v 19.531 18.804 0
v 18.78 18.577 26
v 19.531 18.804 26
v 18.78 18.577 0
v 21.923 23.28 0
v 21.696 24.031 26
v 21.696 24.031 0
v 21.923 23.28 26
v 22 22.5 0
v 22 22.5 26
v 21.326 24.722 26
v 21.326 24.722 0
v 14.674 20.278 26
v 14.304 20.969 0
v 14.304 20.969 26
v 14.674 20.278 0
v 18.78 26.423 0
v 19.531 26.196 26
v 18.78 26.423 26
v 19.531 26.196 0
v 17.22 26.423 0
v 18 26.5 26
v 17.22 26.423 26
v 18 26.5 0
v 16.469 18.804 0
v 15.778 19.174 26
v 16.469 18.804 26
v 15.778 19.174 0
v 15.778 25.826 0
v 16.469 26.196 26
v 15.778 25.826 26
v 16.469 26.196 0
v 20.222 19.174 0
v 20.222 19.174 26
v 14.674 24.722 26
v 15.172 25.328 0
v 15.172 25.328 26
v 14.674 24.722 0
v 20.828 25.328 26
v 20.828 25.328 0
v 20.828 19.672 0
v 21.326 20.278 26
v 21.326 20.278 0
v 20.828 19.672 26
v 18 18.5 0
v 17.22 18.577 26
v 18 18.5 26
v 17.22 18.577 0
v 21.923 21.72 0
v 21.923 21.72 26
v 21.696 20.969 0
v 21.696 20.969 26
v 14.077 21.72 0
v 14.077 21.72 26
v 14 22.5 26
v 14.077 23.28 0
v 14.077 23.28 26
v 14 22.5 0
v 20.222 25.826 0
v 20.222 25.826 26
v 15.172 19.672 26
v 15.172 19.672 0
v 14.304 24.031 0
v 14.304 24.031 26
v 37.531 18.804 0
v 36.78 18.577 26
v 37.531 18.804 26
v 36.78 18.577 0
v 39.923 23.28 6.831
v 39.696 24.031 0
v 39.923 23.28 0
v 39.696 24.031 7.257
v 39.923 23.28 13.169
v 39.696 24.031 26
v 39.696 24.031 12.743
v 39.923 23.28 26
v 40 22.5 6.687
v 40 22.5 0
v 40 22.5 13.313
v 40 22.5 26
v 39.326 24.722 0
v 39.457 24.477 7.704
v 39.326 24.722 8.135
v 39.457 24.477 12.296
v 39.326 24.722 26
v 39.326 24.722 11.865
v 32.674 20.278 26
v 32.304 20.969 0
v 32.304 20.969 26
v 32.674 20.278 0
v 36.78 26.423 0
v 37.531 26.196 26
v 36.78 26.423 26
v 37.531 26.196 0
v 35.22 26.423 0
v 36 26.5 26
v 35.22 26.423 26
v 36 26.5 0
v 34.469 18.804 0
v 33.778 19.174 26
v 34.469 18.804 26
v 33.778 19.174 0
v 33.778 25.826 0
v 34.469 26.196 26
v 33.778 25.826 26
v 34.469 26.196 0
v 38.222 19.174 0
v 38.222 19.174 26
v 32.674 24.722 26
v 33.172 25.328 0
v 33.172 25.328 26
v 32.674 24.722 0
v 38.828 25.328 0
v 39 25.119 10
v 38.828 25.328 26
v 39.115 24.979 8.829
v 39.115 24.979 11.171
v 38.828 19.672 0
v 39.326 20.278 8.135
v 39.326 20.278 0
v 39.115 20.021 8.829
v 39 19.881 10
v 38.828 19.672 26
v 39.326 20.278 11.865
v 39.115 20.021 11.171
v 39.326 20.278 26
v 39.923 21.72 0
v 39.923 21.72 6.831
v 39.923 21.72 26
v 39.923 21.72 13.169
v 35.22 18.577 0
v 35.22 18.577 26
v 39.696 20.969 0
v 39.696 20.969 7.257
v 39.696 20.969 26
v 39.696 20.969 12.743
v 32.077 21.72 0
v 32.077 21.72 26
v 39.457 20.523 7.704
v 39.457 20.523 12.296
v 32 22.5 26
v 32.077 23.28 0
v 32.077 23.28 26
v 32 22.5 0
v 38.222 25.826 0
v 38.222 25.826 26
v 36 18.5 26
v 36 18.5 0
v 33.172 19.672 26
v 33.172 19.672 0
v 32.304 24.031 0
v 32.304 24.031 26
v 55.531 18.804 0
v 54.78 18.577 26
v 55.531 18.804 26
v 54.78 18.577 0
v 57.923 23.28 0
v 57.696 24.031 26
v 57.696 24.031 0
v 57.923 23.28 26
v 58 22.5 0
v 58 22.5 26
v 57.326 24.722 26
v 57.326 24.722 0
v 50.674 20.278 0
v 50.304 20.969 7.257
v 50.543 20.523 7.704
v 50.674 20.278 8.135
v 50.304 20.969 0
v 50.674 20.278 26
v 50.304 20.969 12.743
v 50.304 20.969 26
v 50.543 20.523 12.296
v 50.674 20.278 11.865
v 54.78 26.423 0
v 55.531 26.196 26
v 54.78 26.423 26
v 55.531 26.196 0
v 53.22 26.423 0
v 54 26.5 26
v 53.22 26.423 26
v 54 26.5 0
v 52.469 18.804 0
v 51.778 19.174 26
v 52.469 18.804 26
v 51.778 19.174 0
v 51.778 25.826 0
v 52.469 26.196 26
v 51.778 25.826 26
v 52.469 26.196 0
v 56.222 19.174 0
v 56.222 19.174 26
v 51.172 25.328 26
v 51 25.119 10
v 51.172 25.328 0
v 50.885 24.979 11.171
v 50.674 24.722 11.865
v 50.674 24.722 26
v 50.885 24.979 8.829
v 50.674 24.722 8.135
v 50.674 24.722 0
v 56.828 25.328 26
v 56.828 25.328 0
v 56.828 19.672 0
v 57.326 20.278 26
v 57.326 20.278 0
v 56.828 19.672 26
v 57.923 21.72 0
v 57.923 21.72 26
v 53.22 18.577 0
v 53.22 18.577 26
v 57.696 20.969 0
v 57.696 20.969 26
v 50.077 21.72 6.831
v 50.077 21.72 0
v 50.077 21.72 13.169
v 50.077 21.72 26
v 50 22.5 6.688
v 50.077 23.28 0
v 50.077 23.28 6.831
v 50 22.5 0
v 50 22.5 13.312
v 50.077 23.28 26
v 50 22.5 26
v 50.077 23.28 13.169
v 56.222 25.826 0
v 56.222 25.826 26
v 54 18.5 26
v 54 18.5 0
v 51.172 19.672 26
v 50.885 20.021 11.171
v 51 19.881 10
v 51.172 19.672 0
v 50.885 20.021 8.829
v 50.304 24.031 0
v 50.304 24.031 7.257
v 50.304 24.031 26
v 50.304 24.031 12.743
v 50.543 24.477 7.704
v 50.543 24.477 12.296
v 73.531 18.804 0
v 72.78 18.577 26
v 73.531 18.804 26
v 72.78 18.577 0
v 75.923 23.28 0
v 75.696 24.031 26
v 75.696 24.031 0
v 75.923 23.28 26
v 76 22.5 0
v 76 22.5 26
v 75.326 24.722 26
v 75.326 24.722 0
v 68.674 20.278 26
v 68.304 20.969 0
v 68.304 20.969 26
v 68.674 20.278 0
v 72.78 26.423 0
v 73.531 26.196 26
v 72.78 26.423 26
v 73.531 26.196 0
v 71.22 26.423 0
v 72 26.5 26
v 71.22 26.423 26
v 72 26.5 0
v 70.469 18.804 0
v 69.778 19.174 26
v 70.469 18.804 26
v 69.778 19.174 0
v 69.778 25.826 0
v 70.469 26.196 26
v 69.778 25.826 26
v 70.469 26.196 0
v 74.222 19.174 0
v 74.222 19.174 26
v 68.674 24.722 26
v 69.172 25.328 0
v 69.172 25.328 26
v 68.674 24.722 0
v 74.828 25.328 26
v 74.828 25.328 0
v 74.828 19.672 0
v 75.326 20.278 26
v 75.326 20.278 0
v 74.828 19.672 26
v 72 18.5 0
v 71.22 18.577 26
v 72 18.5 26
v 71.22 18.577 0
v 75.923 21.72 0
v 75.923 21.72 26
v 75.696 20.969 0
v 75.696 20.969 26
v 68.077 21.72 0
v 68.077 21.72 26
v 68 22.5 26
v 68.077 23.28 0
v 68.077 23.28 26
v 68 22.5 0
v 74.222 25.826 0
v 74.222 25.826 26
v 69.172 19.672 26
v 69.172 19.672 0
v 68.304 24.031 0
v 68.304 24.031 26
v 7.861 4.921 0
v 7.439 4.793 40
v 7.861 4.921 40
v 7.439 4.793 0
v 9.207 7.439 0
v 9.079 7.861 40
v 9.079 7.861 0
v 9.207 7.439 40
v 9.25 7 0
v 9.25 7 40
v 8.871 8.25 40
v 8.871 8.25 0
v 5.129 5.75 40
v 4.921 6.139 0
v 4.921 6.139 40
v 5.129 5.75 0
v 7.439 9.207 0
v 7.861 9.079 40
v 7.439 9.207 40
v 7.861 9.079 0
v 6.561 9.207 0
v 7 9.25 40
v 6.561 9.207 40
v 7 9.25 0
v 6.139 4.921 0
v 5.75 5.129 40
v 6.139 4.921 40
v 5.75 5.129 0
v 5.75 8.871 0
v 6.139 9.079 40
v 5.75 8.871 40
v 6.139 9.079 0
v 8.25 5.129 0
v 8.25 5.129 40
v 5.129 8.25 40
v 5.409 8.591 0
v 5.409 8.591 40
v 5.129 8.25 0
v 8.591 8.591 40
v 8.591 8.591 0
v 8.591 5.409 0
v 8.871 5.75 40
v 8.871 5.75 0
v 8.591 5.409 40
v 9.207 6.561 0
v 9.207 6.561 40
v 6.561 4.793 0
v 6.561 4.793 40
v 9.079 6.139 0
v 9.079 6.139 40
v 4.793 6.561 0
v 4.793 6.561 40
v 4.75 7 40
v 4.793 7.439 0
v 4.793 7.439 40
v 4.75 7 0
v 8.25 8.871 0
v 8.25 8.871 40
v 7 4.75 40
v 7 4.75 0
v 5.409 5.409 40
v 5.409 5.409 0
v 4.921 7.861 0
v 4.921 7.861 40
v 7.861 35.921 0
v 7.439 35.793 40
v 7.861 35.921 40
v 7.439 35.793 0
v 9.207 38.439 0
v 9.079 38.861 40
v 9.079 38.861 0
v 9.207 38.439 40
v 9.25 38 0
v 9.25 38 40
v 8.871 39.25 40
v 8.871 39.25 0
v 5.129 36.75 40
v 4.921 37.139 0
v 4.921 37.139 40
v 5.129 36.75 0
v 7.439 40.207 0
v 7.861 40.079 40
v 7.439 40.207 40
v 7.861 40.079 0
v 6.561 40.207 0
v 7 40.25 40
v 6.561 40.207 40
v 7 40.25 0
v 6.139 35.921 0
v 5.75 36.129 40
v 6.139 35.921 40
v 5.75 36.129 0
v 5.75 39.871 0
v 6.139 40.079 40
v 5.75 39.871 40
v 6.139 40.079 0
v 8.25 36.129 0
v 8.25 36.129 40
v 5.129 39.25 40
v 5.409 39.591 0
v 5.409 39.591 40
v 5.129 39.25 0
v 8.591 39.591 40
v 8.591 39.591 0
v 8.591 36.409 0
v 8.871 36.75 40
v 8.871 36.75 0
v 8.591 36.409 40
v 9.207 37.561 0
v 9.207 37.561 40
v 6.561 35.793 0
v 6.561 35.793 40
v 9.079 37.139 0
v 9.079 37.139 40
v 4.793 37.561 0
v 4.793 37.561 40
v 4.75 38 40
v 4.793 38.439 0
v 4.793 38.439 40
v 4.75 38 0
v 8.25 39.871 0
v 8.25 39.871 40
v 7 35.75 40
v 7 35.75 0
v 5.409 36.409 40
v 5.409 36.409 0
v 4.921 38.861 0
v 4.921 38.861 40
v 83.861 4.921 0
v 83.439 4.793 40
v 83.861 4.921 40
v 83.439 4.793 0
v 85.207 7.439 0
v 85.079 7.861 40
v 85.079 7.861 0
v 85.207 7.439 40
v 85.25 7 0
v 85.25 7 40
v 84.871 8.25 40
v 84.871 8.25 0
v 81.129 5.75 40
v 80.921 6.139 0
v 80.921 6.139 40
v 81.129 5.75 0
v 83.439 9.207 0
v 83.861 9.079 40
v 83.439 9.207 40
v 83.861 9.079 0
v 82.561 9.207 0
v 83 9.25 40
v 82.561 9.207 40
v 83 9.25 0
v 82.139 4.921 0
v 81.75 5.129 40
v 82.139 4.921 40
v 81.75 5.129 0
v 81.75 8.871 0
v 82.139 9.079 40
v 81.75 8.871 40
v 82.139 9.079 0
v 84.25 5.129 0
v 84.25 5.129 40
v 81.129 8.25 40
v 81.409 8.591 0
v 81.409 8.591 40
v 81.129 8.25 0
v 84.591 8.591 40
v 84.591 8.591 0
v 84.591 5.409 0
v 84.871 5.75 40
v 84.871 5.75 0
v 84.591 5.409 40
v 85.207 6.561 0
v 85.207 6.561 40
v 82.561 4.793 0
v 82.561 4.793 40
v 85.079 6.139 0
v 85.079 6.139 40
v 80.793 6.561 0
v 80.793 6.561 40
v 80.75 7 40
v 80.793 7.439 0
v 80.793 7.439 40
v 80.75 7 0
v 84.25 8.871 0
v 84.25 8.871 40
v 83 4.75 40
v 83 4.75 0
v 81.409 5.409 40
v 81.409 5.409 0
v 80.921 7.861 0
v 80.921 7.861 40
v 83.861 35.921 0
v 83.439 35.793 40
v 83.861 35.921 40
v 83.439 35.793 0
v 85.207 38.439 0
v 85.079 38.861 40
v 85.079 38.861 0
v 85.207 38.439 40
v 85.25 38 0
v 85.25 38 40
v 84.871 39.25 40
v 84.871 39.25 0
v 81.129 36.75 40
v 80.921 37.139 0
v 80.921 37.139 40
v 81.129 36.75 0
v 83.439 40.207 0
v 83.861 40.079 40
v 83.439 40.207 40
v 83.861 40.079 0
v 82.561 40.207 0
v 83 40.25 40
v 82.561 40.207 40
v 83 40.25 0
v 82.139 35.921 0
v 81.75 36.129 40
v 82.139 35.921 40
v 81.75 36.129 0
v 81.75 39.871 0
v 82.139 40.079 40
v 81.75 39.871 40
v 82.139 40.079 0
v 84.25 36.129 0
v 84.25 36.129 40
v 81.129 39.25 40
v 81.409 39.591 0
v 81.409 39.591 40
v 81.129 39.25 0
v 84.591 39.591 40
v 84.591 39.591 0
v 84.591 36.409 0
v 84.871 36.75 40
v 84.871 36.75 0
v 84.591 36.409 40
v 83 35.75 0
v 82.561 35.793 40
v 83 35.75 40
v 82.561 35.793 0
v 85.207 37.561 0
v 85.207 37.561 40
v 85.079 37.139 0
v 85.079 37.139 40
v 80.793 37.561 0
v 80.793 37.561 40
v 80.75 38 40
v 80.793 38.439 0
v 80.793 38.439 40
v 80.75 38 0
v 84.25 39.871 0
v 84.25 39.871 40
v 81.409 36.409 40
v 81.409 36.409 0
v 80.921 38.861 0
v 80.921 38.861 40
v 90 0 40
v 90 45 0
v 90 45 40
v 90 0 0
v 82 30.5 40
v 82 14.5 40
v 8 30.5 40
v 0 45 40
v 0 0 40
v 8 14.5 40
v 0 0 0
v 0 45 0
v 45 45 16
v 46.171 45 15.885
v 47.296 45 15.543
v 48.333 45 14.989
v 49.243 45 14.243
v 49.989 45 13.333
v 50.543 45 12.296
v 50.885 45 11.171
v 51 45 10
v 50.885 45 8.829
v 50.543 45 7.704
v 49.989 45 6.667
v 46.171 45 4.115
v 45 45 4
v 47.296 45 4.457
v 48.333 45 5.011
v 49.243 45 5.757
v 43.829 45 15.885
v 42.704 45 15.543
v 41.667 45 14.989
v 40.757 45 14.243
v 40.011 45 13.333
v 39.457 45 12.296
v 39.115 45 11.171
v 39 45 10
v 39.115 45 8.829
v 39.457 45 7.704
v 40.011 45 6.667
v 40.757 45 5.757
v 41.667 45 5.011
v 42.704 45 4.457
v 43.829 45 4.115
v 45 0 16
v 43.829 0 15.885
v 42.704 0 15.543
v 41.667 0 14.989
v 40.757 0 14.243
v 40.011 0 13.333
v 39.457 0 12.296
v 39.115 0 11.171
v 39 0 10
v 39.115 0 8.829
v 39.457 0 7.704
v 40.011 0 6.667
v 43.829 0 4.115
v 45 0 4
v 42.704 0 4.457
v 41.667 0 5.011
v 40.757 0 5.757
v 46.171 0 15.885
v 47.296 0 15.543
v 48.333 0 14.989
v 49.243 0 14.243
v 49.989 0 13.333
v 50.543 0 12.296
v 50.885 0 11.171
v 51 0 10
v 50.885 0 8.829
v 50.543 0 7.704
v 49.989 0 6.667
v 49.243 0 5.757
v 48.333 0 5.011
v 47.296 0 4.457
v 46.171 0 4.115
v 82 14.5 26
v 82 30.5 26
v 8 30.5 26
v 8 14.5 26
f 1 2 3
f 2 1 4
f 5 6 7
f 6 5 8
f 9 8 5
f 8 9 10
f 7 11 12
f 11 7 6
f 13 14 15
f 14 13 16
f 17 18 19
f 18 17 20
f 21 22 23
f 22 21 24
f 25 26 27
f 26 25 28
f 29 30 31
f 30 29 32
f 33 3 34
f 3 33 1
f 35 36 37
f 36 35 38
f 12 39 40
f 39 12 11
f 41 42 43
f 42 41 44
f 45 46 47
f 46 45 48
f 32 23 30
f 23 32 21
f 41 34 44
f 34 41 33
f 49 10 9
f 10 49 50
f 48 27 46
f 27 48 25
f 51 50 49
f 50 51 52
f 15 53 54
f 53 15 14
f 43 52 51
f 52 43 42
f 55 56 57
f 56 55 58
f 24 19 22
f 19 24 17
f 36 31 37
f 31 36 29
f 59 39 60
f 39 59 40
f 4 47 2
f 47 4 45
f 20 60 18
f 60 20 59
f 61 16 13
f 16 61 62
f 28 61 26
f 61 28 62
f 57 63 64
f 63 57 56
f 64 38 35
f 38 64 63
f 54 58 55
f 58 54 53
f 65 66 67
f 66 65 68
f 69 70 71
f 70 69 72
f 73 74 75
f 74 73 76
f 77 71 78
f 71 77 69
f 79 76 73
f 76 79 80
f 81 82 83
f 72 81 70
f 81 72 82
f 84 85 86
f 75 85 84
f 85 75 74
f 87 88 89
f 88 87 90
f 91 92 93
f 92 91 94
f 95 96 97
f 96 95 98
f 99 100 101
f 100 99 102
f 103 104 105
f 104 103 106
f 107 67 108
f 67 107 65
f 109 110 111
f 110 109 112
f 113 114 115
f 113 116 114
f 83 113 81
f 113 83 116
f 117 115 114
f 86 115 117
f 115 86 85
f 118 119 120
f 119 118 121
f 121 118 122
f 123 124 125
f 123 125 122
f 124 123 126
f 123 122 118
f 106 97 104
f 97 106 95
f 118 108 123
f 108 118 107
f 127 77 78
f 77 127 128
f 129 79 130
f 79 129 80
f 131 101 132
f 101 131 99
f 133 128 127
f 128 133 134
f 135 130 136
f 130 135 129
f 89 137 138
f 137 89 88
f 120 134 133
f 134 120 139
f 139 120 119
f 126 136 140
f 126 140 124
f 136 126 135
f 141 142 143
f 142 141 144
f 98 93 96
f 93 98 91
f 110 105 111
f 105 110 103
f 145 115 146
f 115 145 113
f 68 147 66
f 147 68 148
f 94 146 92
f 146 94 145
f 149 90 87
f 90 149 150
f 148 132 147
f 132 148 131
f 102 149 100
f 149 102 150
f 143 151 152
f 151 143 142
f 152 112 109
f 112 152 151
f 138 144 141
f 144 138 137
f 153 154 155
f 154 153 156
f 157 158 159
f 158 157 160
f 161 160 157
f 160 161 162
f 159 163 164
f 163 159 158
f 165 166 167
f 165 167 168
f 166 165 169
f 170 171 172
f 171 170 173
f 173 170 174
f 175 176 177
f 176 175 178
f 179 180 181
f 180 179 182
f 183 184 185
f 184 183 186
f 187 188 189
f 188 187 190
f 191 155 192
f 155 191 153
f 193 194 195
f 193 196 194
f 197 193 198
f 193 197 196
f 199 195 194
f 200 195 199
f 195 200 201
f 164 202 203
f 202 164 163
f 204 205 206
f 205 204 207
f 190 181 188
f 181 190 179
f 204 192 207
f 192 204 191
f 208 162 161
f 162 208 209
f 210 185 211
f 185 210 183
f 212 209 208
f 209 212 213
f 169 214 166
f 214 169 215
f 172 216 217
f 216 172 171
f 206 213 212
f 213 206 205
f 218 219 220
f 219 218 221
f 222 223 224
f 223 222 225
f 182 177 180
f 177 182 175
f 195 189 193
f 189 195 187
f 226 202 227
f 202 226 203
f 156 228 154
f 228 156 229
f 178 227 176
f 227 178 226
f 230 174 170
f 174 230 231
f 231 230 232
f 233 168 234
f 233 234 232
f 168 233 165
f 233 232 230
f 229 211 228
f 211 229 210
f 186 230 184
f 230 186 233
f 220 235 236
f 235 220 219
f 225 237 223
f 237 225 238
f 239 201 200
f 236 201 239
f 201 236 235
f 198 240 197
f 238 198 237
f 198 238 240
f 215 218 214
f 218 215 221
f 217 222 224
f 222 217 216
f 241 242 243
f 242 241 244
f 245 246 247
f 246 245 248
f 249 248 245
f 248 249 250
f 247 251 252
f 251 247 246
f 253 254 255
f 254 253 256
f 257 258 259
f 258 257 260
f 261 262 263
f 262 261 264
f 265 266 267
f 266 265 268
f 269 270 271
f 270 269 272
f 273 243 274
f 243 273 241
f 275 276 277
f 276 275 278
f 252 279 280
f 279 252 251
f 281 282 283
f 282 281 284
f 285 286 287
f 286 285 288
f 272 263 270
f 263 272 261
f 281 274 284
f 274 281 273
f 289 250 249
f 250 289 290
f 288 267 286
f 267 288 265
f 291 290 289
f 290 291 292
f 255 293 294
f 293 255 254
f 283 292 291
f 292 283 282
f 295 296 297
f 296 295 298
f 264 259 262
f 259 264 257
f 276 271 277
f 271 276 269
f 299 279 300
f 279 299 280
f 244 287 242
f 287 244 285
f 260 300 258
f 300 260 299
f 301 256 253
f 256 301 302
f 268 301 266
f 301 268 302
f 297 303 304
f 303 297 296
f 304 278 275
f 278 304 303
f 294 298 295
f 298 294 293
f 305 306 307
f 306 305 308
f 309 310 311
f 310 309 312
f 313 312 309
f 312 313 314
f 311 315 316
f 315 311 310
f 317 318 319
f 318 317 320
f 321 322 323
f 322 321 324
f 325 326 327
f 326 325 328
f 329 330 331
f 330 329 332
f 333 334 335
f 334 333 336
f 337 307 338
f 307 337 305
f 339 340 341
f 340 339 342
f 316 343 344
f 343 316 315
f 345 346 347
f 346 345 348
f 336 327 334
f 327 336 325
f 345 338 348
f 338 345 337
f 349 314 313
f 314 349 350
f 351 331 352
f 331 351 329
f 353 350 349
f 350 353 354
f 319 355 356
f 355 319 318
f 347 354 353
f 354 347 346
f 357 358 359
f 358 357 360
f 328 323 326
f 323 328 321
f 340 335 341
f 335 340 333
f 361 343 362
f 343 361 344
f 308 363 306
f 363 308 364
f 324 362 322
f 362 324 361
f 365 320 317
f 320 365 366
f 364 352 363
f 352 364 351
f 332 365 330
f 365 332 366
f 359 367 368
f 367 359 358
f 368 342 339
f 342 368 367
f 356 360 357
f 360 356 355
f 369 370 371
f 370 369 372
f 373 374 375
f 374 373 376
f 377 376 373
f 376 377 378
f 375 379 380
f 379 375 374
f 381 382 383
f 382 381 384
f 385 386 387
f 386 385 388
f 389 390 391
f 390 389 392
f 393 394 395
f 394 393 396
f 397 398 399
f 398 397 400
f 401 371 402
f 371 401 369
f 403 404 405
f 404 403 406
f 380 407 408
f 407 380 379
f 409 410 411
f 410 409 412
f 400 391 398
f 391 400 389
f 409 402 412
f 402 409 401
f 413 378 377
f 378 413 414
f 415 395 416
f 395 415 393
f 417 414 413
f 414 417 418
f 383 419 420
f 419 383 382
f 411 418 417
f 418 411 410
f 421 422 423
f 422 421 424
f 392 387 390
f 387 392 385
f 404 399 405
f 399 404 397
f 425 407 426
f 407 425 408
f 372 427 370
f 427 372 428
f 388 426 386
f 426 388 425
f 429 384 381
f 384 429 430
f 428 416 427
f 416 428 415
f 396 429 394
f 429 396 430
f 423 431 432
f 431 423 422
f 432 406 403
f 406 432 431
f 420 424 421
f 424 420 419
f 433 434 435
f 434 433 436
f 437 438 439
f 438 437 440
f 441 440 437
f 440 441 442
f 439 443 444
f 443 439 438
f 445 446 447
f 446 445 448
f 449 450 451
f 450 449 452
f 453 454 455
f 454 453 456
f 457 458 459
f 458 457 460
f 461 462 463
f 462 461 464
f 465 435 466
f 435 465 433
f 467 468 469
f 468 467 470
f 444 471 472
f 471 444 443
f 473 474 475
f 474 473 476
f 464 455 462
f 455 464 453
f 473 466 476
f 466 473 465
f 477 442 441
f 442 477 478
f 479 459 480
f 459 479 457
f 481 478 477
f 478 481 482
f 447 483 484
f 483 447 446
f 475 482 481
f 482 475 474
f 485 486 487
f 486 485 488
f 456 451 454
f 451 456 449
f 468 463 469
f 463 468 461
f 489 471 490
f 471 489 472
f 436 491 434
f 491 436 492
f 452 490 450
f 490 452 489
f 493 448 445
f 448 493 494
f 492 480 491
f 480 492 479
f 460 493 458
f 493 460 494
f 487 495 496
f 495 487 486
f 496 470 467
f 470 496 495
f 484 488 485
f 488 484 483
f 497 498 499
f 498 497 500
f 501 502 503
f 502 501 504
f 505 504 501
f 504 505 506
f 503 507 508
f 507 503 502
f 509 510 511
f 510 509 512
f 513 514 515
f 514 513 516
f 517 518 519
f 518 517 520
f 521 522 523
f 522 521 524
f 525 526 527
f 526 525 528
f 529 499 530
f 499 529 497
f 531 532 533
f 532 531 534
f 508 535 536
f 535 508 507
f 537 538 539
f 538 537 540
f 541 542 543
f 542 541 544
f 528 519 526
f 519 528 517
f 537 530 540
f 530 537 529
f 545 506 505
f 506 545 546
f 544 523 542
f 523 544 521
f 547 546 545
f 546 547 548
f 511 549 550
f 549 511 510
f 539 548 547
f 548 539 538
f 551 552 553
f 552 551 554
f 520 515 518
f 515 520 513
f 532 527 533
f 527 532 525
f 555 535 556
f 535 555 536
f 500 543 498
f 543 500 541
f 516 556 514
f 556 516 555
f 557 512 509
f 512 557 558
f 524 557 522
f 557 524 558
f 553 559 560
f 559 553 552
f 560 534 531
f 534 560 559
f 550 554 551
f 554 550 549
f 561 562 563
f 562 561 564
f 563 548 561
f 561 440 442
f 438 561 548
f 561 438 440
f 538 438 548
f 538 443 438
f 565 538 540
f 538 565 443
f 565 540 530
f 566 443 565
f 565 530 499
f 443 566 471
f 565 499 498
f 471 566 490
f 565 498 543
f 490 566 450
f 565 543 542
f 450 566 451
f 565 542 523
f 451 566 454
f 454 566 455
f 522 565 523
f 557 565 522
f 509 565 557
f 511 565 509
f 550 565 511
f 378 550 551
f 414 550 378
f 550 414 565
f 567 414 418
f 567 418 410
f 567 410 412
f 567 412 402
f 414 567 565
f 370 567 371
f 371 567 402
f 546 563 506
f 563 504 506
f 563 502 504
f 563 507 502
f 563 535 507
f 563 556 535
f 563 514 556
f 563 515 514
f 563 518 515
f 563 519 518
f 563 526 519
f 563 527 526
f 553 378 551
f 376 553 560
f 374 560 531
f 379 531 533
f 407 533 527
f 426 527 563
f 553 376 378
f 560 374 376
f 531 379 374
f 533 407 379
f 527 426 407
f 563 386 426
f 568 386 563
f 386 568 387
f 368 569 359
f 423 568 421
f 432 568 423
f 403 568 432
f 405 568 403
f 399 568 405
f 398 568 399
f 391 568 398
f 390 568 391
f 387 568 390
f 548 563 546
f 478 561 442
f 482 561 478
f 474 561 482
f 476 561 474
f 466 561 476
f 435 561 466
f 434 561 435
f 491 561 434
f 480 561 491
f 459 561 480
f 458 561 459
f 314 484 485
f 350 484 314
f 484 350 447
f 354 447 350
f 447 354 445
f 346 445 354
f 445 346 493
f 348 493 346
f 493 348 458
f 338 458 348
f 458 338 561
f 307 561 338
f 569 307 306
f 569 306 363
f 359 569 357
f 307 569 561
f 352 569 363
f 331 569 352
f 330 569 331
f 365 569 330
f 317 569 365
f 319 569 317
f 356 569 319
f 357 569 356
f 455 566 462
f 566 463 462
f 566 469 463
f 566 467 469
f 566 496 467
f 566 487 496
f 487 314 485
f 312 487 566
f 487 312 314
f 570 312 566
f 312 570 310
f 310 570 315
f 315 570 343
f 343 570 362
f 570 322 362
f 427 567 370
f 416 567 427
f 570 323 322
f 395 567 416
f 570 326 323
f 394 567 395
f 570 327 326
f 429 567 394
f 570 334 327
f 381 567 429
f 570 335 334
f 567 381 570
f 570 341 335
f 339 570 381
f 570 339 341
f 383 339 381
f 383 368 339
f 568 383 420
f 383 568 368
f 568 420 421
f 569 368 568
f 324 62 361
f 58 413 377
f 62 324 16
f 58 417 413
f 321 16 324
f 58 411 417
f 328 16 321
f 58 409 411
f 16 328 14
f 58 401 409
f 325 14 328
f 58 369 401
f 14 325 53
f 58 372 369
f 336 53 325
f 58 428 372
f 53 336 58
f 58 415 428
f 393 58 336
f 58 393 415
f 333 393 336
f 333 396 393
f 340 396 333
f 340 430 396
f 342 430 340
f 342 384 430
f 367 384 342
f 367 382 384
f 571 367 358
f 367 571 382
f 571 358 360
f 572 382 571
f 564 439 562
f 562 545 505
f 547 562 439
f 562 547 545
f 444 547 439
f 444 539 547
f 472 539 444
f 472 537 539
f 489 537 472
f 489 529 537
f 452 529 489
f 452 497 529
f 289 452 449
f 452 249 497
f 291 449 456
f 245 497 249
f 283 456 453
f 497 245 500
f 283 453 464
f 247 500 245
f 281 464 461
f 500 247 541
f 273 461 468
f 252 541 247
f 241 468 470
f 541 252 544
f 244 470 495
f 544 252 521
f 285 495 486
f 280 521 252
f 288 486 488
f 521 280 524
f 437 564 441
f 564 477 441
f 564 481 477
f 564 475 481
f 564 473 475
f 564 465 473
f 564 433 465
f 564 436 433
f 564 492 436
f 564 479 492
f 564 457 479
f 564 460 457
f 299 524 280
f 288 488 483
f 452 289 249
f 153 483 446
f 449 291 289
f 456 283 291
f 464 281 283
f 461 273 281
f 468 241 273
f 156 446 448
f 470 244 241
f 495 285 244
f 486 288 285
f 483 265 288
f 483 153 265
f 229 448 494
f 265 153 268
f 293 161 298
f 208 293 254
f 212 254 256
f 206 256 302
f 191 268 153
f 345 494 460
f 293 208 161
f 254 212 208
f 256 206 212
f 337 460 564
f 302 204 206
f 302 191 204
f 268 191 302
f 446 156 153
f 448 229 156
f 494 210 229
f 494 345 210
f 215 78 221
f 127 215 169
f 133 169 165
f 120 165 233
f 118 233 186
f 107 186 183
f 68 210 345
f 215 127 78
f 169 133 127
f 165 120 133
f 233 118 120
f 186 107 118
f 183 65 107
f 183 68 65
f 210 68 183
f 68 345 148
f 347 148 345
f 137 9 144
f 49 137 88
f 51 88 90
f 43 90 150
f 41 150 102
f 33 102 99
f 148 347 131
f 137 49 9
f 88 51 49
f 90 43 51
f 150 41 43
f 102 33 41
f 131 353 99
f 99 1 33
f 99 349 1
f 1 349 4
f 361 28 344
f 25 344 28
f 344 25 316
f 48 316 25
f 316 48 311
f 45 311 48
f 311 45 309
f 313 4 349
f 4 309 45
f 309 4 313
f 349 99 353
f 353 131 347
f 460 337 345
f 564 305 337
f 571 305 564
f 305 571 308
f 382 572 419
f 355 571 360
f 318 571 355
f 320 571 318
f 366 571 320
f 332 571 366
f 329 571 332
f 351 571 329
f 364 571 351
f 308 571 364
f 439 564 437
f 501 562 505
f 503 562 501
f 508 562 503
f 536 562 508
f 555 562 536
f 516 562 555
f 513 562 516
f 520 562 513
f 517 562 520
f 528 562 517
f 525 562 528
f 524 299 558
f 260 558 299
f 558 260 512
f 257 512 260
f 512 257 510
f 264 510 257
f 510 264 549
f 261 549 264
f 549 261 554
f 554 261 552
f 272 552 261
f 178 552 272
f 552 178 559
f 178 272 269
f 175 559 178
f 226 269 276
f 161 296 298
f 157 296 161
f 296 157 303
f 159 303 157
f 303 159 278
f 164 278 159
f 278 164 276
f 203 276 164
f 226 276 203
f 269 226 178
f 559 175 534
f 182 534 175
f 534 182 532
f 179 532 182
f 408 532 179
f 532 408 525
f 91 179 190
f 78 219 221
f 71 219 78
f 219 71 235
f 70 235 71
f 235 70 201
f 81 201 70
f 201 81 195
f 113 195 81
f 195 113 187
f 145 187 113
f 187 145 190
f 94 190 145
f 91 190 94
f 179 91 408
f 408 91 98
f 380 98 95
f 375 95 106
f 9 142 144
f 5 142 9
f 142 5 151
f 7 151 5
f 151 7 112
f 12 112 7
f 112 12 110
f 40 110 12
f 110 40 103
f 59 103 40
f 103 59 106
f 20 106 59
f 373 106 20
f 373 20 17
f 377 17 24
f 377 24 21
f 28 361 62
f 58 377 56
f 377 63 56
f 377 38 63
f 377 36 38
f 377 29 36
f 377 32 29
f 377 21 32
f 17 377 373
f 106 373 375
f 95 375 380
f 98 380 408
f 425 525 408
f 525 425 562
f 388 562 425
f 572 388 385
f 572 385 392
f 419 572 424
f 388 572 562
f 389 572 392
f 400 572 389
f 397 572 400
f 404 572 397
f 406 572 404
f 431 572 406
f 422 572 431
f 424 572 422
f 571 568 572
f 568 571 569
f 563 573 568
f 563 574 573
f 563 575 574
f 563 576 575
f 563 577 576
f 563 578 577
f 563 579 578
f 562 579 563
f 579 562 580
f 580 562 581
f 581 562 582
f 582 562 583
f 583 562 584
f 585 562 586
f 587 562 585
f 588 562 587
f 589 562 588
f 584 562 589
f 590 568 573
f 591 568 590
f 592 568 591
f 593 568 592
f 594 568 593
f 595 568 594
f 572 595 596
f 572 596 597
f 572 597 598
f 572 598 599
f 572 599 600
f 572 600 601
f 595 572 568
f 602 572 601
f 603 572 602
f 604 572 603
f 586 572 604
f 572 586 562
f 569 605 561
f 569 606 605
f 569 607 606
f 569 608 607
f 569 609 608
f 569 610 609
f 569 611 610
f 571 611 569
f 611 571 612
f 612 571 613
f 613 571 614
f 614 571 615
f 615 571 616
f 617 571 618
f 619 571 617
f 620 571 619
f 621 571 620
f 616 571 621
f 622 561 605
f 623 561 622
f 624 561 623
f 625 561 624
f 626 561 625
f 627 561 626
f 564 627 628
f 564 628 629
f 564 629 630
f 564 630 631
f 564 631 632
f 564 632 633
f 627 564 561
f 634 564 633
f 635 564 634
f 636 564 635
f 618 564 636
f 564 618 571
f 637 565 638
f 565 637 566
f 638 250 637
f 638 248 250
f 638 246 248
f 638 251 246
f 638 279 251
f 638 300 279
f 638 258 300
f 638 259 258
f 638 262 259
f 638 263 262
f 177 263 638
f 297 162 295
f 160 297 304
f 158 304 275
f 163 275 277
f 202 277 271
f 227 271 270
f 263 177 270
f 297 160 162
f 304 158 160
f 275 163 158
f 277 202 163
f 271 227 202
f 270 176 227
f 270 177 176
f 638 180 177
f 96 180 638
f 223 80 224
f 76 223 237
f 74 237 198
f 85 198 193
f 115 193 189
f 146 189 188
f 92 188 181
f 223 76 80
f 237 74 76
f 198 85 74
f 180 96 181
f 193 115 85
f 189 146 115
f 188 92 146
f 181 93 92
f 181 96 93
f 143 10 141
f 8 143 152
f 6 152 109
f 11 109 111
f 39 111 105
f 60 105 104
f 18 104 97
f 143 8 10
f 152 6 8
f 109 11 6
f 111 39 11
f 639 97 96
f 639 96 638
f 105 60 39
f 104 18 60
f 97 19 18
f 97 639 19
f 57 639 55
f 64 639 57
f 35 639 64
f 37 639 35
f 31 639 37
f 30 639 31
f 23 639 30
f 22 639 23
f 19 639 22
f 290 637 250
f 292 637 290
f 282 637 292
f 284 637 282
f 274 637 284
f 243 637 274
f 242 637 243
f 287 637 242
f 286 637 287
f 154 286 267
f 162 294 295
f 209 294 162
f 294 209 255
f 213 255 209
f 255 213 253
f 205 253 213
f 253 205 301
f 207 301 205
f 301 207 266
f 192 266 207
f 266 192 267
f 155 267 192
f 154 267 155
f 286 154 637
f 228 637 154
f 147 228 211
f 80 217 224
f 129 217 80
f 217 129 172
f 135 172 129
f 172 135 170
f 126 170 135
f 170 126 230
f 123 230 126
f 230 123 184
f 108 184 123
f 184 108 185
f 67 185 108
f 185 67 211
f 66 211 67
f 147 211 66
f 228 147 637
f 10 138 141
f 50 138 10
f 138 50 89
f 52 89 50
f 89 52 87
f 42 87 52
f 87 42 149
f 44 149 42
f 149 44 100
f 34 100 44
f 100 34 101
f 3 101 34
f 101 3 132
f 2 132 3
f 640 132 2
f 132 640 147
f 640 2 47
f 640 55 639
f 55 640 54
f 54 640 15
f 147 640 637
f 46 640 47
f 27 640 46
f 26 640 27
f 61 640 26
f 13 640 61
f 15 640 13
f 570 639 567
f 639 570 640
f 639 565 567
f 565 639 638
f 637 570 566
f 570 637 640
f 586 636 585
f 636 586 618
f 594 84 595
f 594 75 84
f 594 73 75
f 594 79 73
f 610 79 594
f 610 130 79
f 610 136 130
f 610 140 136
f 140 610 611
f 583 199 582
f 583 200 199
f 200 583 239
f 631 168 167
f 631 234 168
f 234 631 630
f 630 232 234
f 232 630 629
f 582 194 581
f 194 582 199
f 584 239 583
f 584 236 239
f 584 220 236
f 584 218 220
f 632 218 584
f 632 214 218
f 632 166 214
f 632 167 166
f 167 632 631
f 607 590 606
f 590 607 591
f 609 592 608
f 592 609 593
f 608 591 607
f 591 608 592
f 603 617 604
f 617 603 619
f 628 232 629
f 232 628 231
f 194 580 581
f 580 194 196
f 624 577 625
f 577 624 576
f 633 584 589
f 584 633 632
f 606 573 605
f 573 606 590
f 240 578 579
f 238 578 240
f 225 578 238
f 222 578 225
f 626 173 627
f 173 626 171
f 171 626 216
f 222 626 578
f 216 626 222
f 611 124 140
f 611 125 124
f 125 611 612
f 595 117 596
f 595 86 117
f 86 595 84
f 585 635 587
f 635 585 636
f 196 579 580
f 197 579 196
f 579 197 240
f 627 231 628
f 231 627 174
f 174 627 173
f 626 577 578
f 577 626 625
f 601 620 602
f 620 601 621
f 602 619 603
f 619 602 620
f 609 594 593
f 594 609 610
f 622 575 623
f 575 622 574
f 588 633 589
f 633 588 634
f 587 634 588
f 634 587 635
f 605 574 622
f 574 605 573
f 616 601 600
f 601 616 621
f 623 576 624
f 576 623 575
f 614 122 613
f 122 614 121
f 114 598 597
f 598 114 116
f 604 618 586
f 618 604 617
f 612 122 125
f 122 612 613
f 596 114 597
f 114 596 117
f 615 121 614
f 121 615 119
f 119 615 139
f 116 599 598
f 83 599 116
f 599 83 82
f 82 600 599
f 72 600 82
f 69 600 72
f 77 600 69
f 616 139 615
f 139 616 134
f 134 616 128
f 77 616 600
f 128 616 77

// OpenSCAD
$fn = 32;

// ----------------------------------------------------------------------
// Manifold block: side_outlet manifold
// ----------------------------------------------------------------------

// --- parameters (mm) ---
block_l = 90;             // block length, X
block_w = 45;             // block width, Y
block_h = 40;             // block height, Z
port_d = 8;               // port bore diameter
port_pitch = 18;          // port pitch along X
gallery_d = 16;           // top gallery width, Y
gallery_depth = 14;       // gallery pocket depth
wall_p = 8;               // gallery end wall thickness, X
mnt_d = 4.5;              // mounting hole diameter
mnt_in = 7;               // mounting hole inset from the edges
out_d = 12;               // outlet bore diameter
out_z = 10;               // outlet axis height

n_ports = 4;  // ports in the row
port_x0 = (block_l - (n_ports - 1) * port_pitch) / 2;  // first port X

difference() {
  cube([block_l, block_w, block_h]);
  for (i = [0 : n_ports - 1])
    translate([port_x0 + i * port_pitch, block_w / 2, -1])
      cylinder(h = block_h + 2, d = port_d);
  translate([wall_p, block_w / 2 - gallery_d / 2, block_h - gallery_depth])
    cube([block_l - 2 * wall_p, gallery_d, gallery_depth + 1]);
  for (cx = [mnt_in, block_l - mnt_in])
    for (cy = [mnt_in, block_w - mnt_in])
      translate([cx, cy, -1]) cylinder(h = block_h + 2, d = mnt_d);
  translate([block_l / 2, -1, out_z]) rotate([-90, 0, 0])
    cylinder(h = block_w + 2, d = out_d);
}
